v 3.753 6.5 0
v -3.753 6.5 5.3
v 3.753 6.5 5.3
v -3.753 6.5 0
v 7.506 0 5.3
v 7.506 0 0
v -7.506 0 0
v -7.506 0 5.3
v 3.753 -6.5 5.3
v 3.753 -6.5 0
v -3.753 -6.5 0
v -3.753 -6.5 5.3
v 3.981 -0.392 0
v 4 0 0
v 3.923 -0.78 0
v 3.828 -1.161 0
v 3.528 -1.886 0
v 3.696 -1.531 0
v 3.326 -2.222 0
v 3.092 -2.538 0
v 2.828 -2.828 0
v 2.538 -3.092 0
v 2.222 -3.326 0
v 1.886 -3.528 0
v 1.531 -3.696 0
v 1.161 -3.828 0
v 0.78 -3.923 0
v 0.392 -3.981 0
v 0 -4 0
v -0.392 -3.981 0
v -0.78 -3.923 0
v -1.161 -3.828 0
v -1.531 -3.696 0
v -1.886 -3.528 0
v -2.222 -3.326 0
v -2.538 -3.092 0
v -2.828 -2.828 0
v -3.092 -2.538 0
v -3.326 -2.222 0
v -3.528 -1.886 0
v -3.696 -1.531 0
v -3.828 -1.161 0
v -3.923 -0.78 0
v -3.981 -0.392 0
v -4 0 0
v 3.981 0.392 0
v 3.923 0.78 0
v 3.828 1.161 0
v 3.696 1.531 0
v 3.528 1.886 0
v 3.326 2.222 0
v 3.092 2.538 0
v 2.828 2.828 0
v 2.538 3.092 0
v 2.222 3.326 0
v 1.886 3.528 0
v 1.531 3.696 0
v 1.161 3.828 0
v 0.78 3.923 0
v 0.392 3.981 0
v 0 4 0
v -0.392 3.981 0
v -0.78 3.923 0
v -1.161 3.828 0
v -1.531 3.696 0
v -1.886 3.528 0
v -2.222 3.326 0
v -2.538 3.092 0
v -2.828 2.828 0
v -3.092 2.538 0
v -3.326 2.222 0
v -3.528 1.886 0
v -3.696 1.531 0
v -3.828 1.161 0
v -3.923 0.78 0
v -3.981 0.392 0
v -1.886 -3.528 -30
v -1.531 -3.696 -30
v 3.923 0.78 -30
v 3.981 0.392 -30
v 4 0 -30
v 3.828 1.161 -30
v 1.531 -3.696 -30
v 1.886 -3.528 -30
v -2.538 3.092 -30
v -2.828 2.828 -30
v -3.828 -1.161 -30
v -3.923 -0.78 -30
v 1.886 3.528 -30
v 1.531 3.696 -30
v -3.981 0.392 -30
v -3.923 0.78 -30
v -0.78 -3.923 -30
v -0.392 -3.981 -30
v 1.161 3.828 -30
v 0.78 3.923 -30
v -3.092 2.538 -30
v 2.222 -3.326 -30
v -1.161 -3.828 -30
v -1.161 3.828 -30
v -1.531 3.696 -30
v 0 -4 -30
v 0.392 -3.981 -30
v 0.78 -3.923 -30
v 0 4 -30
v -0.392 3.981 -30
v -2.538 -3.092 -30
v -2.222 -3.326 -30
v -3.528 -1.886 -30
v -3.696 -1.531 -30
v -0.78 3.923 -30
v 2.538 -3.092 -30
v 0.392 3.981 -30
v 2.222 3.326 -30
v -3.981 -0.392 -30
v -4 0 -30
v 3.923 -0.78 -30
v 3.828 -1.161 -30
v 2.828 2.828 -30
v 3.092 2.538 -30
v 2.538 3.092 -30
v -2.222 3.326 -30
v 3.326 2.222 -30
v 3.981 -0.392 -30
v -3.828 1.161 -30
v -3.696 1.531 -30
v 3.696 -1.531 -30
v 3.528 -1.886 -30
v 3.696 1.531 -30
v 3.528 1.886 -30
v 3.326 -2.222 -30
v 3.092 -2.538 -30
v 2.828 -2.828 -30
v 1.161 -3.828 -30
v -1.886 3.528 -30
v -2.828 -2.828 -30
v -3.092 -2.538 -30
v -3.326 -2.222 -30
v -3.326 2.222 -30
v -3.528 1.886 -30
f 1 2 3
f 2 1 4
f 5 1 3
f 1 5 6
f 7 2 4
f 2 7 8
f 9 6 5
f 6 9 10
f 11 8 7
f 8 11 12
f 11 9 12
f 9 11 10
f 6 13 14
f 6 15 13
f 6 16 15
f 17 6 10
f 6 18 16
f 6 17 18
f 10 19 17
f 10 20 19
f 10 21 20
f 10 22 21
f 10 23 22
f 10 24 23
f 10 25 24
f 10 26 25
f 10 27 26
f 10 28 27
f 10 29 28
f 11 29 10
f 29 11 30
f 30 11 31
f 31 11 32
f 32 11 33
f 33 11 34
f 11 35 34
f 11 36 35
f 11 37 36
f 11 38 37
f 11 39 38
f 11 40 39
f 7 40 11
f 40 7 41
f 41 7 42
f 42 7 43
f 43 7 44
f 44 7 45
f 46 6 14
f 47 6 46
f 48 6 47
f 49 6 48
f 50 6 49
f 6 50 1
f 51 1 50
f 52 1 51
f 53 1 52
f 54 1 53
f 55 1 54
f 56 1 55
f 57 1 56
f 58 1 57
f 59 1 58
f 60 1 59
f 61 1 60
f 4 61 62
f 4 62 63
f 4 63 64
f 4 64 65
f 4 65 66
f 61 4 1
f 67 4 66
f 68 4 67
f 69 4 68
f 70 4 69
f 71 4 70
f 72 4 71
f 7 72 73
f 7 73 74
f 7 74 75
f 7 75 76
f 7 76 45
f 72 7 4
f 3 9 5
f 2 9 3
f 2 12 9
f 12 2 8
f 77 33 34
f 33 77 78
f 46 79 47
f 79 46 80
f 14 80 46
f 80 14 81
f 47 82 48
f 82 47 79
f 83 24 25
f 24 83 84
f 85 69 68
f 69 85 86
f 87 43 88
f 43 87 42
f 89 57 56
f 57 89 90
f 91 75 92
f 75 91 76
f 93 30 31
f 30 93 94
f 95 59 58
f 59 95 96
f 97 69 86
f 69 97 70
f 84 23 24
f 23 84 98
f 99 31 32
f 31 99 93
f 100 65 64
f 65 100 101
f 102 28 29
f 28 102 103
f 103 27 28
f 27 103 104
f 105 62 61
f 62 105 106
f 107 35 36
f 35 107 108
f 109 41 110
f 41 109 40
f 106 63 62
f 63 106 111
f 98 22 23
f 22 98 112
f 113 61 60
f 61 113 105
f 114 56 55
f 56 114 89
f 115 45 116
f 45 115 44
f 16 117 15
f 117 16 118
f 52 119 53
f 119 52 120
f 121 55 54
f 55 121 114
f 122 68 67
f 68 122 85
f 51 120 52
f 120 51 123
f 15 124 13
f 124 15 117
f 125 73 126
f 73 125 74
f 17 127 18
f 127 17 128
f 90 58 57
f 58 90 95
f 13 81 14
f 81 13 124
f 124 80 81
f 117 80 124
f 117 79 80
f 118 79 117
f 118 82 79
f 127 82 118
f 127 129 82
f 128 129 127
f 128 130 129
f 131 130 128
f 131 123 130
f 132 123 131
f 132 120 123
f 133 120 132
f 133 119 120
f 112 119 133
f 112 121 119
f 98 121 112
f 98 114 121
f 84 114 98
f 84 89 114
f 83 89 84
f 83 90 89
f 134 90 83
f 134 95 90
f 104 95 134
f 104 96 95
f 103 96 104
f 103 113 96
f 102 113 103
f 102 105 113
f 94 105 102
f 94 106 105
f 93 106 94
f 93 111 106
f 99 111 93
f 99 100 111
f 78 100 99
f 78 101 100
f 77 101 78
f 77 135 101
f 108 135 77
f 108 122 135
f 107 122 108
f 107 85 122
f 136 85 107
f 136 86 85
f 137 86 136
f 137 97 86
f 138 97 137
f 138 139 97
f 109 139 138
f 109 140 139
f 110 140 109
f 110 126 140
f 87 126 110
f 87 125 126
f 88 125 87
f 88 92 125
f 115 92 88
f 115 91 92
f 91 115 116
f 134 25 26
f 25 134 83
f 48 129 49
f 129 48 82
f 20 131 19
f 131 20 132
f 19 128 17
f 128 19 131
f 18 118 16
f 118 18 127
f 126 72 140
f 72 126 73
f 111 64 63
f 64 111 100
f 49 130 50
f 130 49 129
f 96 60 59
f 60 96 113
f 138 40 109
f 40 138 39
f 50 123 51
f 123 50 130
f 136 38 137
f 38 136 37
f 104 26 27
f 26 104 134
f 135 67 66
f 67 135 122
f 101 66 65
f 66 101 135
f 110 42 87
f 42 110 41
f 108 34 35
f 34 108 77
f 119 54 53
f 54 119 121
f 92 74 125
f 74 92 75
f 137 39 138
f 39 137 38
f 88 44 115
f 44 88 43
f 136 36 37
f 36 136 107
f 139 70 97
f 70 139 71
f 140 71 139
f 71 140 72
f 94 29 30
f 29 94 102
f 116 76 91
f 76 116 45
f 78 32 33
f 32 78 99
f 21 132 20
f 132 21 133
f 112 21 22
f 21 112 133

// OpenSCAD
// M8規格準拠の六角ボルト（ねじ山は省略、シャンクは円柱）
af = 13;            // across flats (mm)
head_h = 5.3;        // head height (mm)
shank_len = 30;      // shank length (mm)
shank_r = 4;         // shank radius (mm) -> Ø8 mm

R = af / sqrt(3);    // hex head circumradius

head_pts = [
  [ R, 0 ],
  [ R/2, R*sqrt(3)/2 ],
  [ -R/2, R*sqrt(3)/2 ],
  [ -R, 0 ],
  [ -R/2, -R*sqrt(3)/2 ],
  [ R/2, -R*sqrt(3)/2 ]
];

module hex_head() {
  linear_extrude(height = head_h)
    polygon(points = head_pts);
}

module shank() {
  translate([0, 0, -shank_len])
    cylinder(h = shank_len, r = shank_r, $fn = 64);
}

union() {
  hex_head();
  shank();
}
